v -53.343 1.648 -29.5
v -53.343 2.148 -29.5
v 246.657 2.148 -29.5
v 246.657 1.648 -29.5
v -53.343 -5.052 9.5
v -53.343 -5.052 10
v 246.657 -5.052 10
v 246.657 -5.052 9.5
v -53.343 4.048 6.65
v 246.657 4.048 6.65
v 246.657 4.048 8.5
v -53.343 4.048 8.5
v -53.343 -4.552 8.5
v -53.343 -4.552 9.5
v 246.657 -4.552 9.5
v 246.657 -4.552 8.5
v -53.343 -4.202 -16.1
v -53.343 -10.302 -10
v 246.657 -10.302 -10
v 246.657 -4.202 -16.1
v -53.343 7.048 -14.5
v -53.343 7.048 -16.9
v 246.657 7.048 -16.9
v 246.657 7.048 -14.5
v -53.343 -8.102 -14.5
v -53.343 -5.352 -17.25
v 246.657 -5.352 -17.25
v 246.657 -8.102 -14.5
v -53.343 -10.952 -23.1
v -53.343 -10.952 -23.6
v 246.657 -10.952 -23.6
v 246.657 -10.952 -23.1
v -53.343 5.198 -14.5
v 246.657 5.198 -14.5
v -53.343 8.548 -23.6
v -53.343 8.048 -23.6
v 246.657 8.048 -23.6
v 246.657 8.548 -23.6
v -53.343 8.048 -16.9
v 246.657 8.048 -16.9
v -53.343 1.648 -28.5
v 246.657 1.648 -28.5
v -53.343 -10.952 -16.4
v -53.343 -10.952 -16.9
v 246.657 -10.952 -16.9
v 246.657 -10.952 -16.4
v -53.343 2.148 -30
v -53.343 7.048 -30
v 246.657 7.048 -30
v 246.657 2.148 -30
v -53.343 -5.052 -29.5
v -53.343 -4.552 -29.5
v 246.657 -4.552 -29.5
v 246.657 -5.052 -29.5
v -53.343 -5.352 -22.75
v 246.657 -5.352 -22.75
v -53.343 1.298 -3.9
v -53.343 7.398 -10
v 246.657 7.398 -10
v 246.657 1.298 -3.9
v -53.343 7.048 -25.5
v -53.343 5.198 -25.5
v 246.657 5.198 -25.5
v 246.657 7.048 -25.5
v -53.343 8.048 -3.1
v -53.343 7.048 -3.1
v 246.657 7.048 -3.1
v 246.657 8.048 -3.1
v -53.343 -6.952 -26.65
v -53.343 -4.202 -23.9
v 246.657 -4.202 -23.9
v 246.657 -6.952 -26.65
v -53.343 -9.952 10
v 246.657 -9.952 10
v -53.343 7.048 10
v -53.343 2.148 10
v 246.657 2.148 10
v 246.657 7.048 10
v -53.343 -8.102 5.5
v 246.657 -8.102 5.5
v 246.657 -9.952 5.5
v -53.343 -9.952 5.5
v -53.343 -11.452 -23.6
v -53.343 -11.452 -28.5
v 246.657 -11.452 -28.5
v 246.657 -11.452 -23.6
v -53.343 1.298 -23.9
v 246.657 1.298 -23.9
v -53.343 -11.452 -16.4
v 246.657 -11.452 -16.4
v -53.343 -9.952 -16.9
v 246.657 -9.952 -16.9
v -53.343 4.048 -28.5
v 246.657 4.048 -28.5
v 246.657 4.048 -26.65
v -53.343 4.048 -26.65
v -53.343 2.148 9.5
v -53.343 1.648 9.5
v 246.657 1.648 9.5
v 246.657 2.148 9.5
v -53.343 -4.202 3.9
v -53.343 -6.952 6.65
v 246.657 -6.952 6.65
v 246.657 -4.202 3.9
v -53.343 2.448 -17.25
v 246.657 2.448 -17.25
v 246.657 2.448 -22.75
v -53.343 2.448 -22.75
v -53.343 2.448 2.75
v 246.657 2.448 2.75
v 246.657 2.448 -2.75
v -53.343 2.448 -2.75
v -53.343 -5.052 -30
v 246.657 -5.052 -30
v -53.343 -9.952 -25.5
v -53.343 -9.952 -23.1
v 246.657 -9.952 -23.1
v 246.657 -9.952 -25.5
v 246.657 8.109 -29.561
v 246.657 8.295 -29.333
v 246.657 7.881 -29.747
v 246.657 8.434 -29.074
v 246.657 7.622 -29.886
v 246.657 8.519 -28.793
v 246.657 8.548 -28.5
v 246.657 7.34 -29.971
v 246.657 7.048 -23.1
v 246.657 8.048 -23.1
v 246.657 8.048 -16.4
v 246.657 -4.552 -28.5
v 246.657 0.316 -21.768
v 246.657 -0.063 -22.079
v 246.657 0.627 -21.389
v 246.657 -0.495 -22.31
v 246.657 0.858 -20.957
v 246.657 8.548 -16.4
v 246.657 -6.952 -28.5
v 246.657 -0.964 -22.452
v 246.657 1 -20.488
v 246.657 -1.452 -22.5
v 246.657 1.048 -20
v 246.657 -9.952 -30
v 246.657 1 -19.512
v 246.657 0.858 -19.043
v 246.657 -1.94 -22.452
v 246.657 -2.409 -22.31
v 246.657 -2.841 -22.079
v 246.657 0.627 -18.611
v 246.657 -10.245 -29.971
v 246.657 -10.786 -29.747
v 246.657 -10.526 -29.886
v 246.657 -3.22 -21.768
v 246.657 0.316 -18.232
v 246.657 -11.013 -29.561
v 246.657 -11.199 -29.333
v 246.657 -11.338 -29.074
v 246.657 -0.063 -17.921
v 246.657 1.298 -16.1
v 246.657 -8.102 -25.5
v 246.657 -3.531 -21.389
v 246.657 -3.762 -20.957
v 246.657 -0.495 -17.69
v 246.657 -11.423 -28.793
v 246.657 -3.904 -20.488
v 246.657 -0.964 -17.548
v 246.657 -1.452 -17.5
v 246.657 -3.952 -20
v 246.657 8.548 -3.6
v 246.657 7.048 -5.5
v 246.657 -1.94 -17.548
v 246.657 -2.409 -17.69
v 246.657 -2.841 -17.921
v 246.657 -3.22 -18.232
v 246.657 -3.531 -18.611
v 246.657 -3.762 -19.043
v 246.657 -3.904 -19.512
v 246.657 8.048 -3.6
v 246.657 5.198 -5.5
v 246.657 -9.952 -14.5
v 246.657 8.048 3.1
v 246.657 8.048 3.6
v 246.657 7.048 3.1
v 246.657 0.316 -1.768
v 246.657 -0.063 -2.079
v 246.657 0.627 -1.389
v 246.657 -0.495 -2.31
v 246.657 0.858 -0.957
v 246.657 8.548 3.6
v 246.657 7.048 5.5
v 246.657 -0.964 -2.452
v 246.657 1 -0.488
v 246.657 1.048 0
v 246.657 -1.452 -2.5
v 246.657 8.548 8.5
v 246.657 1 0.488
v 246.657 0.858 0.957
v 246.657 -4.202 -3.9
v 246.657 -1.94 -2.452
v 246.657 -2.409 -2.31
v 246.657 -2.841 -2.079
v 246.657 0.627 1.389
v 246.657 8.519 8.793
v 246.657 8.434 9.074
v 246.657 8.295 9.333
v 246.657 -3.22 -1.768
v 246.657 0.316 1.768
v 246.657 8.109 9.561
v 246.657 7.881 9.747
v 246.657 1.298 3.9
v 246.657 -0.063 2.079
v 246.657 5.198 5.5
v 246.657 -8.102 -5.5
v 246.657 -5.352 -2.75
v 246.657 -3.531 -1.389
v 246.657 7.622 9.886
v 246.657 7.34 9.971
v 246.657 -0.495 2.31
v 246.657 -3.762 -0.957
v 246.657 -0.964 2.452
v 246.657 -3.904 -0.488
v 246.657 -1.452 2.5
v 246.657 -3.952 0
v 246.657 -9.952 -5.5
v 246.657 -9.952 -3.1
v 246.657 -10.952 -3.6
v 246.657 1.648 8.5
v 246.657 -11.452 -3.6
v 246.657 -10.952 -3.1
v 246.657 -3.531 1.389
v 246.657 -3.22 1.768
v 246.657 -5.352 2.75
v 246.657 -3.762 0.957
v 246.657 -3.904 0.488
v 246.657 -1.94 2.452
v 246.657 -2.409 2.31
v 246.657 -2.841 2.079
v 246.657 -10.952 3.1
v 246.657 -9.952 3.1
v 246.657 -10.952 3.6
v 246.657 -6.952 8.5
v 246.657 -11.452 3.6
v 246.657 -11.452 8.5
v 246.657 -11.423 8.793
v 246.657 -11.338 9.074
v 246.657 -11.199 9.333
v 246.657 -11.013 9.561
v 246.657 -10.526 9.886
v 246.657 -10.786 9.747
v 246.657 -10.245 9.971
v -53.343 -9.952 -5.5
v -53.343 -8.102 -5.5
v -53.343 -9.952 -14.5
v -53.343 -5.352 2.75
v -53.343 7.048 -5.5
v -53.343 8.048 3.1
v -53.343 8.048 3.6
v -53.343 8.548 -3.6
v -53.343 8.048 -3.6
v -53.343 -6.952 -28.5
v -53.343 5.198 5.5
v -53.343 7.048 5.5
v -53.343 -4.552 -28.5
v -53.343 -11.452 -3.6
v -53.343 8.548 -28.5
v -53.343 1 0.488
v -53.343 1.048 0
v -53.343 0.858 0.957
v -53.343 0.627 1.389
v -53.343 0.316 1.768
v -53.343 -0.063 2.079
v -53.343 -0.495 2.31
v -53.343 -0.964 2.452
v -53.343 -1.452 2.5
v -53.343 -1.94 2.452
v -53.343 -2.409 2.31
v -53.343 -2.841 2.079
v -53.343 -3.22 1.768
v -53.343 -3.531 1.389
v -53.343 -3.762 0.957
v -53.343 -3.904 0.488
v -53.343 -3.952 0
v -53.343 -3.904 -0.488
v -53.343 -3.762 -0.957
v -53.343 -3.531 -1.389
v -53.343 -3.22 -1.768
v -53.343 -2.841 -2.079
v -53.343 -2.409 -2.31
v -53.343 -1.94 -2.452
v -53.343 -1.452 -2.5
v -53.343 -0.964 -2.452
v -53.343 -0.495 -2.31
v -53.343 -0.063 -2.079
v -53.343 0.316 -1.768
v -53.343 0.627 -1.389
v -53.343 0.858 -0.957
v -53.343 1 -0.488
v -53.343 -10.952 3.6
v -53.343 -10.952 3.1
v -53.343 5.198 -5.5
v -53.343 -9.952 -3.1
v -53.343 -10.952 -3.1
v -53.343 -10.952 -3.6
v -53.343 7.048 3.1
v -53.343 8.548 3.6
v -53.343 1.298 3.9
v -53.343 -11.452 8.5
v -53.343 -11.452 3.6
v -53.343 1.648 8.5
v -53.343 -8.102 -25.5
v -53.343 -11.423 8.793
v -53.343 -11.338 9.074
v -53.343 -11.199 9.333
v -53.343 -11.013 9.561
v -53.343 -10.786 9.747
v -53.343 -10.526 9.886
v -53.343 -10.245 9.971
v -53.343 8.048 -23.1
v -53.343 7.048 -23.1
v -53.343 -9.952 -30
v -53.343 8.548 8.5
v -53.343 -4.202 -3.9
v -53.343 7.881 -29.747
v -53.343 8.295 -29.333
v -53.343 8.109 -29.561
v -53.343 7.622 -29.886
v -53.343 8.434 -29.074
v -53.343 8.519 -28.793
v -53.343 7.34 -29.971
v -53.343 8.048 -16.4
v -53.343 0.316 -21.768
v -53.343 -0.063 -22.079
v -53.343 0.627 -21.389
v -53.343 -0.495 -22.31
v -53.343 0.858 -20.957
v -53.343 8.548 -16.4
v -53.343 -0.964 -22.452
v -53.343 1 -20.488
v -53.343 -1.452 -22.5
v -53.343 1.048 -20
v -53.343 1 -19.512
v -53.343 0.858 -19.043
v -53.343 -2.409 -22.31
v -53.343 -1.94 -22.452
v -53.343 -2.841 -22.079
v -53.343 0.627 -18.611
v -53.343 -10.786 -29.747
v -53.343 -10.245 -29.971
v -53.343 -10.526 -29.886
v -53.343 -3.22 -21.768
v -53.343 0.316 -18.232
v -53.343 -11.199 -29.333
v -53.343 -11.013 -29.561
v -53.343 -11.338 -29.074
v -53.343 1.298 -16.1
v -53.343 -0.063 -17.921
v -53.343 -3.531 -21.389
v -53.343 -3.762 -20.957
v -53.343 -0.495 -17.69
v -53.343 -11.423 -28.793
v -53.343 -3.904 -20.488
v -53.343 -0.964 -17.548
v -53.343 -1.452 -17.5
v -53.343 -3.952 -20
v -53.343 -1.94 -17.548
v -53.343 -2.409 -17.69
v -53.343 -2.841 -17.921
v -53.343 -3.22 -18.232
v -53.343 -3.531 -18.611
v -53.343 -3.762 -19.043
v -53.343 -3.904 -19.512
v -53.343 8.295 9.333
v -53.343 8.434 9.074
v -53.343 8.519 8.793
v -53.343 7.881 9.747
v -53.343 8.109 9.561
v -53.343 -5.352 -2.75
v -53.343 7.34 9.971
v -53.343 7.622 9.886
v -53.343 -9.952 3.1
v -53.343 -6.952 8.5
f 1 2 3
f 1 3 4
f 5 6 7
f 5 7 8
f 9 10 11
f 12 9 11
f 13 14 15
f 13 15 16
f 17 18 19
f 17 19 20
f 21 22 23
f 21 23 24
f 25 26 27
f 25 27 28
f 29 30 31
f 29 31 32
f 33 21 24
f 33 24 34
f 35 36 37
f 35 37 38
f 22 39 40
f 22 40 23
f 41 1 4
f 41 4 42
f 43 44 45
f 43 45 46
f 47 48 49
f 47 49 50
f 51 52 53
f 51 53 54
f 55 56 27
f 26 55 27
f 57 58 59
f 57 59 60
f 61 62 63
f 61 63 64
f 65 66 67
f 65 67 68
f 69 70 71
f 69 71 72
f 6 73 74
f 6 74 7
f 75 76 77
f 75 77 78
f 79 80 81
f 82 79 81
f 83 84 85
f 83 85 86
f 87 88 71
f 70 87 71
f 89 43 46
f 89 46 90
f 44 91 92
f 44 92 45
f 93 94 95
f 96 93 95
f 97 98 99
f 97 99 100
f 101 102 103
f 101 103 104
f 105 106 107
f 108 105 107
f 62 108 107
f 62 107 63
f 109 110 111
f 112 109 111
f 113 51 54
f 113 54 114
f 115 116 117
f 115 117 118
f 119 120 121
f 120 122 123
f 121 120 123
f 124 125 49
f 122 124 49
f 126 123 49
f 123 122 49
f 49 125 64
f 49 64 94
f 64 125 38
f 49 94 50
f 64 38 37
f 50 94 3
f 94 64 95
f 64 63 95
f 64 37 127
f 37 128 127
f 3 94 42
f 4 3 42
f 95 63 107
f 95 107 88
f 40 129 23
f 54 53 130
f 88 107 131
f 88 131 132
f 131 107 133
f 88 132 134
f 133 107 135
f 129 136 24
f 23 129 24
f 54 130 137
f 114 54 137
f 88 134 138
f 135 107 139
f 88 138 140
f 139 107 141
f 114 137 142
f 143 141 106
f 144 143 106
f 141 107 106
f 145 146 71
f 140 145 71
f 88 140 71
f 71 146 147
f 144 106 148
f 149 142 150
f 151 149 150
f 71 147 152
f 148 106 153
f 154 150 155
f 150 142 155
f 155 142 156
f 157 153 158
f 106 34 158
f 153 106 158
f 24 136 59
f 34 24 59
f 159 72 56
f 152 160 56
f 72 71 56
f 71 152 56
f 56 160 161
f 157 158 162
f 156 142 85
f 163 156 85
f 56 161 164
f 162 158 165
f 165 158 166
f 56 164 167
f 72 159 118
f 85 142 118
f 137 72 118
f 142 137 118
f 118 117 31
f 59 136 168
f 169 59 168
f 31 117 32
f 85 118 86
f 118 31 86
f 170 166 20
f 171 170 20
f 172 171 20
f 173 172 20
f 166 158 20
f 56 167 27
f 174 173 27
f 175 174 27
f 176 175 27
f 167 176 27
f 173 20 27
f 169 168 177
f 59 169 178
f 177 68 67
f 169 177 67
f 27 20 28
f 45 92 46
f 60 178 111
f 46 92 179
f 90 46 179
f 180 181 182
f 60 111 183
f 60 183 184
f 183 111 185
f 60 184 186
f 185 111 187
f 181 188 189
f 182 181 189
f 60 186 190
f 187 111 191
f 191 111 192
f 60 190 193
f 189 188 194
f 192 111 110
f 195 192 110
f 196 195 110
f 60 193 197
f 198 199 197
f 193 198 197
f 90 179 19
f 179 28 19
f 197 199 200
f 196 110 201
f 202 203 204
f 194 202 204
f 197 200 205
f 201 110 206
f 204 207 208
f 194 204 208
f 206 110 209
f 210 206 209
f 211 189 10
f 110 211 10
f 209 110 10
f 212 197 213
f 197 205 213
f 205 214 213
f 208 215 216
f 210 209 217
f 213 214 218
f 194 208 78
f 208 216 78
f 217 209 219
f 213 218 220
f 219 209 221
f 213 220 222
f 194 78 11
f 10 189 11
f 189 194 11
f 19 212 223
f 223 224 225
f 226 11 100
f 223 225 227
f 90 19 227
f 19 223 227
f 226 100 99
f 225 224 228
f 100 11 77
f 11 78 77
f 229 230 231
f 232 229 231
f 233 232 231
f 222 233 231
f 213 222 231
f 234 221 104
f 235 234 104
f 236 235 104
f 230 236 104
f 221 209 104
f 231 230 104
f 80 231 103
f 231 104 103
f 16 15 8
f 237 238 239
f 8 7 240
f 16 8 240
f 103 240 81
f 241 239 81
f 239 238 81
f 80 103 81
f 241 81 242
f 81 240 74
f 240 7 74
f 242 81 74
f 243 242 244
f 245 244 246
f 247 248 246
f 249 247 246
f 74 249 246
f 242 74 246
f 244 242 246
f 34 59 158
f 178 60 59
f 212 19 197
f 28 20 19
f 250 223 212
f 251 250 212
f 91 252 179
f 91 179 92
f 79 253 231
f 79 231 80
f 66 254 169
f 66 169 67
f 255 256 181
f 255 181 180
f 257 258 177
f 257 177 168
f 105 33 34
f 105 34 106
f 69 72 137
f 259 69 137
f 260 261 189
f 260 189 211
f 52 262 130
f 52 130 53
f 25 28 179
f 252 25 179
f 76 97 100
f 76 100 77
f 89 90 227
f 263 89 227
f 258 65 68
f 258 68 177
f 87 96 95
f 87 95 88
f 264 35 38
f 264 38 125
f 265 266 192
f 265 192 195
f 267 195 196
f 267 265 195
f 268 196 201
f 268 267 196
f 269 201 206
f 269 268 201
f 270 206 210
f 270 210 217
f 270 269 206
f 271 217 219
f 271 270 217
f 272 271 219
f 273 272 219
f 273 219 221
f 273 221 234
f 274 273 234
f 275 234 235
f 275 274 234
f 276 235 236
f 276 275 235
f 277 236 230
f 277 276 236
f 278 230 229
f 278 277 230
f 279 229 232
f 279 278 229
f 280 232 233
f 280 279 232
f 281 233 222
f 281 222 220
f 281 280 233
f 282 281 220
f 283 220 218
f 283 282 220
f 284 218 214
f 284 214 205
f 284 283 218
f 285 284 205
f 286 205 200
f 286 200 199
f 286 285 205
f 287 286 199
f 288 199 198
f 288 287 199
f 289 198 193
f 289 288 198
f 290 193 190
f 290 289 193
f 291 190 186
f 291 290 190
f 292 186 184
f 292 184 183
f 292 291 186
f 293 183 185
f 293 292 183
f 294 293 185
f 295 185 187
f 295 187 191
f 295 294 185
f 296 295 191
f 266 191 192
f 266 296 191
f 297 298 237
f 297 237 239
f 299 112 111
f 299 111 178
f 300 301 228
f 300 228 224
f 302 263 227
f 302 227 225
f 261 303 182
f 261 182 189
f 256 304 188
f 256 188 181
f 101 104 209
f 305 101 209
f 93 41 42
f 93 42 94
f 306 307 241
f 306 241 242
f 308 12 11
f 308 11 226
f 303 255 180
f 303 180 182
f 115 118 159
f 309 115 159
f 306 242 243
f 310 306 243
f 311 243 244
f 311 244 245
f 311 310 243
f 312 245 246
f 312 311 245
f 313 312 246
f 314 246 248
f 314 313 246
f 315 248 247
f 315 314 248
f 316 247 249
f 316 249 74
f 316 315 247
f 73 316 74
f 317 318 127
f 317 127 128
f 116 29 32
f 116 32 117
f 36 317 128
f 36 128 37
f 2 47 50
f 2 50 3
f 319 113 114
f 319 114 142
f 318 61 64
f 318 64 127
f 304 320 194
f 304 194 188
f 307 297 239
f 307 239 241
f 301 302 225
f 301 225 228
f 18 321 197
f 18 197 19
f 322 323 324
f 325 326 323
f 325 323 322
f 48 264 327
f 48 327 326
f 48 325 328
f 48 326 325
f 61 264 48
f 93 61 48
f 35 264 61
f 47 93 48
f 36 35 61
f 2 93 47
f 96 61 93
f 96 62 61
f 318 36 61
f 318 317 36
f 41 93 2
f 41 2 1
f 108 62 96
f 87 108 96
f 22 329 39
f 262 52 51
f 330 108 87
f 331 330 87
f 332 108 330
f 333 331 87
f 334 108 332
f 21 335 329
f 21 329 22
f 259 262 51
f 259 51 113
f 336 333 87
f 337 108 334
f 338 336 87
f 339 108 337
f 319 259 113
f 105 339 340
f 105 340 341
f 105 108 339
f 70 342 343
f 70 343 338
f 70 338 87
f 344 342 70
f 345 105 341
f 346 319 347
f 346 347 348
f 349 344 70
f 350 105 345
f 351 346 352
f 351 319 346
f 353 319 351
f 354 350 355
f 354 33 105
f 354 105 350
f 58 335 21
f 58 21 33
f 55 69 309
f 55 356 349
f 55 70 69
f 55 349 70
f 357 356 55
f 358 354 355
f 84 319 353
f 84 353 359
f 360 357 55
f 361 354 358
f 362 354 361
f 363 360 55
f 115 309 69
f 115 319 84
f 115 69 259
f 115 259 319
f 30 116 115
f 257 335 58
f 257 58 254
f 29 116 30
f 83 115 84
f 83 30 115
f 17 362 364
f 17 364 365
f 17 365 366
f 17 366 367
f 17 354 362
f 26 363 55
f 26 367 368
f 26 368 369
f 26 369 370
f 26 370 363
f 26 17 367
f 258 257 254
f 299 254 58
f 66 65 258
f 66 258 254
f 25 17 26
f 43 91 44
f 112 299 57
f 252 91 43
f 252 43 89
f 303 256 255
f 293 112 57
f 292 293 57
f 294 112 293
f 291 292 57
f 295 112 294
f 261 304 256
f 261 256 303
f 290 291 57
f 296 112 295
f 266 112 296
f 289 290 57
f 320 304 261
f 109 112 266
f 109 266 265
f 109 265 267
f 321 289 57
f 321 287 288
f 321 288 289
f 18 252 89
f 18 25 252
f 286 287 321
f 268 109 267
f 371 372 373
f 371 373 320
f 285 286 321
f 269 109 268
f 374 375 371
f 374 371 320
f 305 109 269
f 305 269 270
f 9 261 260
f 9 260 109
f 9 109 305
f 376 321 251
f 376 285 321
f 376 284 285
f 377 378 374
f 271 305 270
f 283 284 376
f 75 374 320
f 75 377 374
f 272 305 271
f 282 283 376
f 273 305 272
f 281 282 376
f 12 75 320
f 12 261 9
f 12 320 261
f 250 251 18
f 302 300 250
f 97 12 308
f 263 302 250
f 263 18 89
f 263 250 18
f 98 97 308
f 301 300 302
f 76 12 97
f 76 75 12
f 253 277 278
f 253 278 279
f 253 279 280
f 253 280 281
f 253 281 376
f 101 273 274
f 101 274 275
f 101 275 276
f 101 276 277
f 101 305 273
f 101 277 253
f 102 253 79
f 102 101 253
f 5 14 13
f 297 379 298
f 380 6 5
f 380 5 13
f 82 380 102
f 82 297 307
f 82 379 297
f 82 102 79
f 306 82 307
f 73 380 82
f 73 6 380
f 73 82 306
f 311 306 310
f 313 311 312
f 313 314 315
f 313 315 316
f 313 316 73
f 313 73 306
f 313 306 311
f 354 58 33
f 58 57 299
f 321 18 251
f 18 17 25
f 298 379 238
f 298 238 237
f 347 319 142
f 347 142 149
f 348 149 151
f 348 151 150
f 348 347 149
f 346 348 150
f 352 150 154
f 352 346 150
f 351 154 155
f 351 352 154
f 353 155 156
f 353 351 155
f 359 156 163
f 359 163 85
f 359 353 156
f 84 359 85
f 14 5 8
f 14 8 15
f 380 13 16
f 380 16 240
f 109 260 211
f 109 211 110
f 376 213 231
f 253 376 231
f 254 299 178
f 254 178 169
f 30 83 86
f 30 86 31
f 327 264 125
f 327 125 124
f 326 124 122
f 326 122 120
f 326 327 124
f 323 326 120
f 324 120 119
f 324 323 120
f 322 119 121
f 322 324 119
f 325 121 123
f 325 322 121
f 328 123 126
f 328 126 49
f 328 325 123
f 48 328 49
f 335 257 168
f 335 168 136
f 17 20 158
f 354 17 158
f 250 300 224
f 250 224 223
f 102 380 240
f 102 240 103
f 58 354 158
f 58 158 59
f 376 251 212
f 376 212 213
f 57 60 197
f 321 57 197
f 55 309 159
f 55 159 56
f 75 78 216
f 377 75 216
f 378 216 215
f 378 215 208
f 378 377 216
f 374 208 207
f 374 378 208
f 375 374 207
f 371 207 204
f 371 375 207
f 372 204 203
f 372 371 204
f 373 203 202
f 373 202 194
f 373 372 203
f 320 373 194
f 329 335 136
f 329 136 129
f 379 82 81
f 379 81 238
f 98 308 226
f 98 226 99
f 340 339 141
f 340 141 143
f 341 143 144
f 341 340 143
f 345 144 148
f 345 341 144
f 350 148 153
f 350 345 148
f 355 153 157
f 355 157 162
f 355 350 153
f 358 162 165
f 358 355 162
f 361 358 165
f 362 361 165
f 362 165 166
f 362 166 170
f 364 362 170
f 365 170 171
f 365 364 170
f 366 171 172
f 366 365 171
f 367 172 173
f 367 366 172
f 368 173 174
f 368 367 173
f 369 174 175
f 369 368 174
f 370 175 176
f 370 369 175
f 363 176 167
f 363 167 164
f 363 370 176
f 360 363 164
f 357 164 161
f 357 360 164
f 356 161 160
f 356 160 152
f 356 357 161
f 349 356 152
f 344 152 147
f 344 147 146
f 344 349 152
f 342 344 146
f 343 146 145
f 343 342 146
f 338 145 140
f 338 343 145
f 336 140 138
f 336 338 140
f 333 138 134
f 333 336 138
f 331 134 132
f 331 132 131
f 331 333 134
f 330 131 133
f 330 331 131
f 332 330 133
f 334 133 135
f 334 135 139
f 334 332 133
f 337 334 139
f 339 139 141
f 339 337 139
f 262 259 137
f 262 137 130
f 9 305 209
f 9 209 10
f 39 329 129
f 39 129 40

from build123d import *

# Parameters (mm, degrees)
SKETCH16_R           = 2.5
F_20X40XR1_5_2_DEPTH = 300


with BuildPart() as part:
    # Sketch16 → 铝型材 20X40XR1.5(2) (new body)
    with BuildSketch(Plane(origin=(-53.342500755, -1.452155193, 0), x_dir=(0, 1, 0), z_dir=(1, 0, 0))):
        with BuildLine():
            Line((-3.6, 10), (-3.6, 9.5))
            Line((-3.6, 9.5), (-3.1, 9.5))
            Line((-3.1, 9.5), (-3.1, 8.5))
            Line((-3.1, 8.5), (-5.5, 8.5))
            Line((-5.5, 8.5), (-5.5, 6.65))
            Line((-5.5, 6.65), (-2.75, 3.9))
            Line((-2.75, 3.9), (2.75, 3.9))
            Line((2.75, 3.9), (5.5, 6.65))
            Line((5.5, 6.65), (5.5, 8.5))
            Line((5.5, 8.5), (3.1, 8.5))
            Line((3.1, 8.5), (3.1, 9.5))
            Line((3.1, 9.5), (3.6, 9.5))
            Line((3.6, 9.5), (3.6, 10))
            Line((3.6, 10), (8.5, 10))
            ThreePointArc((8.5, 10), (9.560660172, 9.560660172), (10, 8.5))
            Line((10, 8.5), (10, 3.6))
            Line((10, 3.6), (9.5, 3.6))
            Line((9.5, 3.6), (9.5, 3.1))
            Line((9.5, 3.1), (8.5, 3.1))
            Line((8.5, 3.1), (8.5, 5.5))
            Line((8.5, 5.5), (6.65, 5.5))
            Line((6.65, 5.5), (3.9, 2.75))
            Line((3.9, 2.75), (3.9, -2.75))
            Line((3.9, -2.75), (6.65, -5.5))
            Line((6.65, -5.5), (8.5, -5.5))
            Line((8.5, -5.5), (8.5, -3.1))
            Line((8.5, -3.1), (9.5, -3.1))
            Line((9.5, -3.1), (9.5, -3.6))
            Line((9.5, -3.6), (10, -3.6))
            Line((10, -3.6), (10, -16.4))
            Line((10, -16.4), (9.5, -16.4))
            Line((9.5, -16.4), (9.5, -16.9))
            Line((9.5, -16.9), (8.5, -16.9))
            Line((8.5, -16.9), (8.5, -14.5))
            Line((8.5, -14.5), (6.65, -14.5))
            Line((6.65, -14.5), (3.9, -17.25))
            Line((3.9, -17.25), (3.9, -22.75))
            Line((3.9, -22.75), (6.65, -25.5))
            Line((6.65, -25.5), (8.5, -25.5))
            Line((8.5, -25.5), (8.5, -23.1))
            Line((8.5, -23.1), (9.5, -23.1))
            Line((9.5, -23.1), (9.5, -23.6))
            Line((9.5, -23.6), (10, -23.6))
            Line((10, -23.6), (10, -28.5))
            ThreePointArc((10, -28.5), (9.560660172, -29.560660172), (8.5, -30))
            Line((8.5, -30), (3.6, -30))
            Line((3.6, -30), (3.6, -29.5))
            Line((3.6, -29.5), (3.1, -29.5))
            Line((3.1, -29.5), (3.1, -28.5))
            Line((3.1, -28.5), (5.5, -28.5))
            Line((5.5, -28.5), (5.5, -26.65))
            Line((5.5, -26.65), (2.75, -23.9))
            Line((2.75, -23.9), (-2.75, -23.9))
            Line((-2.75, -23.9), (-5.5, -26.65))
            Line((-5.5, -26.65), (-5.5, -28.5))
            Line((-5.5, -28.5), (-3.1, -28.5))
            Line((-3.1, -28.5), (-3.1, -29.5))
            Line((-3.1, -29.5), (-3.6, -29.5))
            Line((-3.6, -29.5), (-3.6, -30))
            Line((-3.6, -30), (-8.5, -30))
            ThreePointArc((-8.5, -30), (-9.560660172, -29.560660172), (-10, -28.5))
            Line((-10, -28.5), (-10, -23.6))
            Line((-10, -23.6), (-9.5, -23.6))
            Line((-9.5, -23.6), (-9.5, -23.1))
            Line((-9.5, -23.1), (-8.5, -23.1))
            Line((-8.5, -23.1), (-8.5, -25.5))
            Line((-8.5, -25.5), (-6.65, -25.5))
            Line((-6.65, -25.5), (-3.9, -22.75))
            Line((-3.9, -22.75), (-3.9, -17.25))
            Line((-3.9, -17.25), (-6.65, -14.5))
            Line((-6.65, -14.5), (-8.5, -14.5))
            Line((-8.5, -14.5), (-8.5, -16.9))
            Line((-8.5, -16.9), (-9.5, -16.9))
            Line((-9.5, -16.9), (-9.5, -16.4))
            Line((-9.5, -16.4), (-10, -16.4))
            Line((-10, -16.4), (-10, -3.6))
            Line((-10, -3.6), (-9.5, -3.6))
            Line((-9.5, -3.6), (-9.5, -3.1))
            Line((-9.5, -3.1), (-8.5, -3.1))
            Line((-8.5, -3.1), (-8.5, -5.5))
            Line((-8.5, -5.5), (-6.65, -5.5))
            Line((-6.65, -5.5), (-3.9, -2.75))
            Line((-3.9, -2.75), (-3.9, 2.75))
            Line((-3.9, 2.75), (-6.65, 5.5))
            Line((-6.65, 5.5), (-8.5, 5.5))
            Line((-8.5, 5.5), (-8.5, 3.1))
            Line((-8.5, 3.1), (-9.5, 3.1))
            Line((-9.5, 3.1), (-9.5, 3.6))
            Line((-9.5, 3.6), (-10, 3.6))
            Line((-10, 3.6), (-10, 8.5))
            ThreePointArc((-10, 8.5), (-9.560660172, 9.560660172), (-8.5, 10))
            Line((-8.5, 10), (-3.6, 10))
        make_face()
        Circle(SKETCH16_R, mode=Mode.SUBTRACT)
        with Locations((0, -20)):
            Circle(SKETCH16_R, mode=Mode.SUBTRACT)
        Polygon((8.85, -10), (2.75, -3.9), (-2.75, -3.9), (-8.85, -10), (-2.75, -16.1), (2.75, -16.1), align=None, mode=Mode.SUBTRACT)
    extrude(amount=F_20X40XR1_5_2_DEPTH)


solid = part.part
